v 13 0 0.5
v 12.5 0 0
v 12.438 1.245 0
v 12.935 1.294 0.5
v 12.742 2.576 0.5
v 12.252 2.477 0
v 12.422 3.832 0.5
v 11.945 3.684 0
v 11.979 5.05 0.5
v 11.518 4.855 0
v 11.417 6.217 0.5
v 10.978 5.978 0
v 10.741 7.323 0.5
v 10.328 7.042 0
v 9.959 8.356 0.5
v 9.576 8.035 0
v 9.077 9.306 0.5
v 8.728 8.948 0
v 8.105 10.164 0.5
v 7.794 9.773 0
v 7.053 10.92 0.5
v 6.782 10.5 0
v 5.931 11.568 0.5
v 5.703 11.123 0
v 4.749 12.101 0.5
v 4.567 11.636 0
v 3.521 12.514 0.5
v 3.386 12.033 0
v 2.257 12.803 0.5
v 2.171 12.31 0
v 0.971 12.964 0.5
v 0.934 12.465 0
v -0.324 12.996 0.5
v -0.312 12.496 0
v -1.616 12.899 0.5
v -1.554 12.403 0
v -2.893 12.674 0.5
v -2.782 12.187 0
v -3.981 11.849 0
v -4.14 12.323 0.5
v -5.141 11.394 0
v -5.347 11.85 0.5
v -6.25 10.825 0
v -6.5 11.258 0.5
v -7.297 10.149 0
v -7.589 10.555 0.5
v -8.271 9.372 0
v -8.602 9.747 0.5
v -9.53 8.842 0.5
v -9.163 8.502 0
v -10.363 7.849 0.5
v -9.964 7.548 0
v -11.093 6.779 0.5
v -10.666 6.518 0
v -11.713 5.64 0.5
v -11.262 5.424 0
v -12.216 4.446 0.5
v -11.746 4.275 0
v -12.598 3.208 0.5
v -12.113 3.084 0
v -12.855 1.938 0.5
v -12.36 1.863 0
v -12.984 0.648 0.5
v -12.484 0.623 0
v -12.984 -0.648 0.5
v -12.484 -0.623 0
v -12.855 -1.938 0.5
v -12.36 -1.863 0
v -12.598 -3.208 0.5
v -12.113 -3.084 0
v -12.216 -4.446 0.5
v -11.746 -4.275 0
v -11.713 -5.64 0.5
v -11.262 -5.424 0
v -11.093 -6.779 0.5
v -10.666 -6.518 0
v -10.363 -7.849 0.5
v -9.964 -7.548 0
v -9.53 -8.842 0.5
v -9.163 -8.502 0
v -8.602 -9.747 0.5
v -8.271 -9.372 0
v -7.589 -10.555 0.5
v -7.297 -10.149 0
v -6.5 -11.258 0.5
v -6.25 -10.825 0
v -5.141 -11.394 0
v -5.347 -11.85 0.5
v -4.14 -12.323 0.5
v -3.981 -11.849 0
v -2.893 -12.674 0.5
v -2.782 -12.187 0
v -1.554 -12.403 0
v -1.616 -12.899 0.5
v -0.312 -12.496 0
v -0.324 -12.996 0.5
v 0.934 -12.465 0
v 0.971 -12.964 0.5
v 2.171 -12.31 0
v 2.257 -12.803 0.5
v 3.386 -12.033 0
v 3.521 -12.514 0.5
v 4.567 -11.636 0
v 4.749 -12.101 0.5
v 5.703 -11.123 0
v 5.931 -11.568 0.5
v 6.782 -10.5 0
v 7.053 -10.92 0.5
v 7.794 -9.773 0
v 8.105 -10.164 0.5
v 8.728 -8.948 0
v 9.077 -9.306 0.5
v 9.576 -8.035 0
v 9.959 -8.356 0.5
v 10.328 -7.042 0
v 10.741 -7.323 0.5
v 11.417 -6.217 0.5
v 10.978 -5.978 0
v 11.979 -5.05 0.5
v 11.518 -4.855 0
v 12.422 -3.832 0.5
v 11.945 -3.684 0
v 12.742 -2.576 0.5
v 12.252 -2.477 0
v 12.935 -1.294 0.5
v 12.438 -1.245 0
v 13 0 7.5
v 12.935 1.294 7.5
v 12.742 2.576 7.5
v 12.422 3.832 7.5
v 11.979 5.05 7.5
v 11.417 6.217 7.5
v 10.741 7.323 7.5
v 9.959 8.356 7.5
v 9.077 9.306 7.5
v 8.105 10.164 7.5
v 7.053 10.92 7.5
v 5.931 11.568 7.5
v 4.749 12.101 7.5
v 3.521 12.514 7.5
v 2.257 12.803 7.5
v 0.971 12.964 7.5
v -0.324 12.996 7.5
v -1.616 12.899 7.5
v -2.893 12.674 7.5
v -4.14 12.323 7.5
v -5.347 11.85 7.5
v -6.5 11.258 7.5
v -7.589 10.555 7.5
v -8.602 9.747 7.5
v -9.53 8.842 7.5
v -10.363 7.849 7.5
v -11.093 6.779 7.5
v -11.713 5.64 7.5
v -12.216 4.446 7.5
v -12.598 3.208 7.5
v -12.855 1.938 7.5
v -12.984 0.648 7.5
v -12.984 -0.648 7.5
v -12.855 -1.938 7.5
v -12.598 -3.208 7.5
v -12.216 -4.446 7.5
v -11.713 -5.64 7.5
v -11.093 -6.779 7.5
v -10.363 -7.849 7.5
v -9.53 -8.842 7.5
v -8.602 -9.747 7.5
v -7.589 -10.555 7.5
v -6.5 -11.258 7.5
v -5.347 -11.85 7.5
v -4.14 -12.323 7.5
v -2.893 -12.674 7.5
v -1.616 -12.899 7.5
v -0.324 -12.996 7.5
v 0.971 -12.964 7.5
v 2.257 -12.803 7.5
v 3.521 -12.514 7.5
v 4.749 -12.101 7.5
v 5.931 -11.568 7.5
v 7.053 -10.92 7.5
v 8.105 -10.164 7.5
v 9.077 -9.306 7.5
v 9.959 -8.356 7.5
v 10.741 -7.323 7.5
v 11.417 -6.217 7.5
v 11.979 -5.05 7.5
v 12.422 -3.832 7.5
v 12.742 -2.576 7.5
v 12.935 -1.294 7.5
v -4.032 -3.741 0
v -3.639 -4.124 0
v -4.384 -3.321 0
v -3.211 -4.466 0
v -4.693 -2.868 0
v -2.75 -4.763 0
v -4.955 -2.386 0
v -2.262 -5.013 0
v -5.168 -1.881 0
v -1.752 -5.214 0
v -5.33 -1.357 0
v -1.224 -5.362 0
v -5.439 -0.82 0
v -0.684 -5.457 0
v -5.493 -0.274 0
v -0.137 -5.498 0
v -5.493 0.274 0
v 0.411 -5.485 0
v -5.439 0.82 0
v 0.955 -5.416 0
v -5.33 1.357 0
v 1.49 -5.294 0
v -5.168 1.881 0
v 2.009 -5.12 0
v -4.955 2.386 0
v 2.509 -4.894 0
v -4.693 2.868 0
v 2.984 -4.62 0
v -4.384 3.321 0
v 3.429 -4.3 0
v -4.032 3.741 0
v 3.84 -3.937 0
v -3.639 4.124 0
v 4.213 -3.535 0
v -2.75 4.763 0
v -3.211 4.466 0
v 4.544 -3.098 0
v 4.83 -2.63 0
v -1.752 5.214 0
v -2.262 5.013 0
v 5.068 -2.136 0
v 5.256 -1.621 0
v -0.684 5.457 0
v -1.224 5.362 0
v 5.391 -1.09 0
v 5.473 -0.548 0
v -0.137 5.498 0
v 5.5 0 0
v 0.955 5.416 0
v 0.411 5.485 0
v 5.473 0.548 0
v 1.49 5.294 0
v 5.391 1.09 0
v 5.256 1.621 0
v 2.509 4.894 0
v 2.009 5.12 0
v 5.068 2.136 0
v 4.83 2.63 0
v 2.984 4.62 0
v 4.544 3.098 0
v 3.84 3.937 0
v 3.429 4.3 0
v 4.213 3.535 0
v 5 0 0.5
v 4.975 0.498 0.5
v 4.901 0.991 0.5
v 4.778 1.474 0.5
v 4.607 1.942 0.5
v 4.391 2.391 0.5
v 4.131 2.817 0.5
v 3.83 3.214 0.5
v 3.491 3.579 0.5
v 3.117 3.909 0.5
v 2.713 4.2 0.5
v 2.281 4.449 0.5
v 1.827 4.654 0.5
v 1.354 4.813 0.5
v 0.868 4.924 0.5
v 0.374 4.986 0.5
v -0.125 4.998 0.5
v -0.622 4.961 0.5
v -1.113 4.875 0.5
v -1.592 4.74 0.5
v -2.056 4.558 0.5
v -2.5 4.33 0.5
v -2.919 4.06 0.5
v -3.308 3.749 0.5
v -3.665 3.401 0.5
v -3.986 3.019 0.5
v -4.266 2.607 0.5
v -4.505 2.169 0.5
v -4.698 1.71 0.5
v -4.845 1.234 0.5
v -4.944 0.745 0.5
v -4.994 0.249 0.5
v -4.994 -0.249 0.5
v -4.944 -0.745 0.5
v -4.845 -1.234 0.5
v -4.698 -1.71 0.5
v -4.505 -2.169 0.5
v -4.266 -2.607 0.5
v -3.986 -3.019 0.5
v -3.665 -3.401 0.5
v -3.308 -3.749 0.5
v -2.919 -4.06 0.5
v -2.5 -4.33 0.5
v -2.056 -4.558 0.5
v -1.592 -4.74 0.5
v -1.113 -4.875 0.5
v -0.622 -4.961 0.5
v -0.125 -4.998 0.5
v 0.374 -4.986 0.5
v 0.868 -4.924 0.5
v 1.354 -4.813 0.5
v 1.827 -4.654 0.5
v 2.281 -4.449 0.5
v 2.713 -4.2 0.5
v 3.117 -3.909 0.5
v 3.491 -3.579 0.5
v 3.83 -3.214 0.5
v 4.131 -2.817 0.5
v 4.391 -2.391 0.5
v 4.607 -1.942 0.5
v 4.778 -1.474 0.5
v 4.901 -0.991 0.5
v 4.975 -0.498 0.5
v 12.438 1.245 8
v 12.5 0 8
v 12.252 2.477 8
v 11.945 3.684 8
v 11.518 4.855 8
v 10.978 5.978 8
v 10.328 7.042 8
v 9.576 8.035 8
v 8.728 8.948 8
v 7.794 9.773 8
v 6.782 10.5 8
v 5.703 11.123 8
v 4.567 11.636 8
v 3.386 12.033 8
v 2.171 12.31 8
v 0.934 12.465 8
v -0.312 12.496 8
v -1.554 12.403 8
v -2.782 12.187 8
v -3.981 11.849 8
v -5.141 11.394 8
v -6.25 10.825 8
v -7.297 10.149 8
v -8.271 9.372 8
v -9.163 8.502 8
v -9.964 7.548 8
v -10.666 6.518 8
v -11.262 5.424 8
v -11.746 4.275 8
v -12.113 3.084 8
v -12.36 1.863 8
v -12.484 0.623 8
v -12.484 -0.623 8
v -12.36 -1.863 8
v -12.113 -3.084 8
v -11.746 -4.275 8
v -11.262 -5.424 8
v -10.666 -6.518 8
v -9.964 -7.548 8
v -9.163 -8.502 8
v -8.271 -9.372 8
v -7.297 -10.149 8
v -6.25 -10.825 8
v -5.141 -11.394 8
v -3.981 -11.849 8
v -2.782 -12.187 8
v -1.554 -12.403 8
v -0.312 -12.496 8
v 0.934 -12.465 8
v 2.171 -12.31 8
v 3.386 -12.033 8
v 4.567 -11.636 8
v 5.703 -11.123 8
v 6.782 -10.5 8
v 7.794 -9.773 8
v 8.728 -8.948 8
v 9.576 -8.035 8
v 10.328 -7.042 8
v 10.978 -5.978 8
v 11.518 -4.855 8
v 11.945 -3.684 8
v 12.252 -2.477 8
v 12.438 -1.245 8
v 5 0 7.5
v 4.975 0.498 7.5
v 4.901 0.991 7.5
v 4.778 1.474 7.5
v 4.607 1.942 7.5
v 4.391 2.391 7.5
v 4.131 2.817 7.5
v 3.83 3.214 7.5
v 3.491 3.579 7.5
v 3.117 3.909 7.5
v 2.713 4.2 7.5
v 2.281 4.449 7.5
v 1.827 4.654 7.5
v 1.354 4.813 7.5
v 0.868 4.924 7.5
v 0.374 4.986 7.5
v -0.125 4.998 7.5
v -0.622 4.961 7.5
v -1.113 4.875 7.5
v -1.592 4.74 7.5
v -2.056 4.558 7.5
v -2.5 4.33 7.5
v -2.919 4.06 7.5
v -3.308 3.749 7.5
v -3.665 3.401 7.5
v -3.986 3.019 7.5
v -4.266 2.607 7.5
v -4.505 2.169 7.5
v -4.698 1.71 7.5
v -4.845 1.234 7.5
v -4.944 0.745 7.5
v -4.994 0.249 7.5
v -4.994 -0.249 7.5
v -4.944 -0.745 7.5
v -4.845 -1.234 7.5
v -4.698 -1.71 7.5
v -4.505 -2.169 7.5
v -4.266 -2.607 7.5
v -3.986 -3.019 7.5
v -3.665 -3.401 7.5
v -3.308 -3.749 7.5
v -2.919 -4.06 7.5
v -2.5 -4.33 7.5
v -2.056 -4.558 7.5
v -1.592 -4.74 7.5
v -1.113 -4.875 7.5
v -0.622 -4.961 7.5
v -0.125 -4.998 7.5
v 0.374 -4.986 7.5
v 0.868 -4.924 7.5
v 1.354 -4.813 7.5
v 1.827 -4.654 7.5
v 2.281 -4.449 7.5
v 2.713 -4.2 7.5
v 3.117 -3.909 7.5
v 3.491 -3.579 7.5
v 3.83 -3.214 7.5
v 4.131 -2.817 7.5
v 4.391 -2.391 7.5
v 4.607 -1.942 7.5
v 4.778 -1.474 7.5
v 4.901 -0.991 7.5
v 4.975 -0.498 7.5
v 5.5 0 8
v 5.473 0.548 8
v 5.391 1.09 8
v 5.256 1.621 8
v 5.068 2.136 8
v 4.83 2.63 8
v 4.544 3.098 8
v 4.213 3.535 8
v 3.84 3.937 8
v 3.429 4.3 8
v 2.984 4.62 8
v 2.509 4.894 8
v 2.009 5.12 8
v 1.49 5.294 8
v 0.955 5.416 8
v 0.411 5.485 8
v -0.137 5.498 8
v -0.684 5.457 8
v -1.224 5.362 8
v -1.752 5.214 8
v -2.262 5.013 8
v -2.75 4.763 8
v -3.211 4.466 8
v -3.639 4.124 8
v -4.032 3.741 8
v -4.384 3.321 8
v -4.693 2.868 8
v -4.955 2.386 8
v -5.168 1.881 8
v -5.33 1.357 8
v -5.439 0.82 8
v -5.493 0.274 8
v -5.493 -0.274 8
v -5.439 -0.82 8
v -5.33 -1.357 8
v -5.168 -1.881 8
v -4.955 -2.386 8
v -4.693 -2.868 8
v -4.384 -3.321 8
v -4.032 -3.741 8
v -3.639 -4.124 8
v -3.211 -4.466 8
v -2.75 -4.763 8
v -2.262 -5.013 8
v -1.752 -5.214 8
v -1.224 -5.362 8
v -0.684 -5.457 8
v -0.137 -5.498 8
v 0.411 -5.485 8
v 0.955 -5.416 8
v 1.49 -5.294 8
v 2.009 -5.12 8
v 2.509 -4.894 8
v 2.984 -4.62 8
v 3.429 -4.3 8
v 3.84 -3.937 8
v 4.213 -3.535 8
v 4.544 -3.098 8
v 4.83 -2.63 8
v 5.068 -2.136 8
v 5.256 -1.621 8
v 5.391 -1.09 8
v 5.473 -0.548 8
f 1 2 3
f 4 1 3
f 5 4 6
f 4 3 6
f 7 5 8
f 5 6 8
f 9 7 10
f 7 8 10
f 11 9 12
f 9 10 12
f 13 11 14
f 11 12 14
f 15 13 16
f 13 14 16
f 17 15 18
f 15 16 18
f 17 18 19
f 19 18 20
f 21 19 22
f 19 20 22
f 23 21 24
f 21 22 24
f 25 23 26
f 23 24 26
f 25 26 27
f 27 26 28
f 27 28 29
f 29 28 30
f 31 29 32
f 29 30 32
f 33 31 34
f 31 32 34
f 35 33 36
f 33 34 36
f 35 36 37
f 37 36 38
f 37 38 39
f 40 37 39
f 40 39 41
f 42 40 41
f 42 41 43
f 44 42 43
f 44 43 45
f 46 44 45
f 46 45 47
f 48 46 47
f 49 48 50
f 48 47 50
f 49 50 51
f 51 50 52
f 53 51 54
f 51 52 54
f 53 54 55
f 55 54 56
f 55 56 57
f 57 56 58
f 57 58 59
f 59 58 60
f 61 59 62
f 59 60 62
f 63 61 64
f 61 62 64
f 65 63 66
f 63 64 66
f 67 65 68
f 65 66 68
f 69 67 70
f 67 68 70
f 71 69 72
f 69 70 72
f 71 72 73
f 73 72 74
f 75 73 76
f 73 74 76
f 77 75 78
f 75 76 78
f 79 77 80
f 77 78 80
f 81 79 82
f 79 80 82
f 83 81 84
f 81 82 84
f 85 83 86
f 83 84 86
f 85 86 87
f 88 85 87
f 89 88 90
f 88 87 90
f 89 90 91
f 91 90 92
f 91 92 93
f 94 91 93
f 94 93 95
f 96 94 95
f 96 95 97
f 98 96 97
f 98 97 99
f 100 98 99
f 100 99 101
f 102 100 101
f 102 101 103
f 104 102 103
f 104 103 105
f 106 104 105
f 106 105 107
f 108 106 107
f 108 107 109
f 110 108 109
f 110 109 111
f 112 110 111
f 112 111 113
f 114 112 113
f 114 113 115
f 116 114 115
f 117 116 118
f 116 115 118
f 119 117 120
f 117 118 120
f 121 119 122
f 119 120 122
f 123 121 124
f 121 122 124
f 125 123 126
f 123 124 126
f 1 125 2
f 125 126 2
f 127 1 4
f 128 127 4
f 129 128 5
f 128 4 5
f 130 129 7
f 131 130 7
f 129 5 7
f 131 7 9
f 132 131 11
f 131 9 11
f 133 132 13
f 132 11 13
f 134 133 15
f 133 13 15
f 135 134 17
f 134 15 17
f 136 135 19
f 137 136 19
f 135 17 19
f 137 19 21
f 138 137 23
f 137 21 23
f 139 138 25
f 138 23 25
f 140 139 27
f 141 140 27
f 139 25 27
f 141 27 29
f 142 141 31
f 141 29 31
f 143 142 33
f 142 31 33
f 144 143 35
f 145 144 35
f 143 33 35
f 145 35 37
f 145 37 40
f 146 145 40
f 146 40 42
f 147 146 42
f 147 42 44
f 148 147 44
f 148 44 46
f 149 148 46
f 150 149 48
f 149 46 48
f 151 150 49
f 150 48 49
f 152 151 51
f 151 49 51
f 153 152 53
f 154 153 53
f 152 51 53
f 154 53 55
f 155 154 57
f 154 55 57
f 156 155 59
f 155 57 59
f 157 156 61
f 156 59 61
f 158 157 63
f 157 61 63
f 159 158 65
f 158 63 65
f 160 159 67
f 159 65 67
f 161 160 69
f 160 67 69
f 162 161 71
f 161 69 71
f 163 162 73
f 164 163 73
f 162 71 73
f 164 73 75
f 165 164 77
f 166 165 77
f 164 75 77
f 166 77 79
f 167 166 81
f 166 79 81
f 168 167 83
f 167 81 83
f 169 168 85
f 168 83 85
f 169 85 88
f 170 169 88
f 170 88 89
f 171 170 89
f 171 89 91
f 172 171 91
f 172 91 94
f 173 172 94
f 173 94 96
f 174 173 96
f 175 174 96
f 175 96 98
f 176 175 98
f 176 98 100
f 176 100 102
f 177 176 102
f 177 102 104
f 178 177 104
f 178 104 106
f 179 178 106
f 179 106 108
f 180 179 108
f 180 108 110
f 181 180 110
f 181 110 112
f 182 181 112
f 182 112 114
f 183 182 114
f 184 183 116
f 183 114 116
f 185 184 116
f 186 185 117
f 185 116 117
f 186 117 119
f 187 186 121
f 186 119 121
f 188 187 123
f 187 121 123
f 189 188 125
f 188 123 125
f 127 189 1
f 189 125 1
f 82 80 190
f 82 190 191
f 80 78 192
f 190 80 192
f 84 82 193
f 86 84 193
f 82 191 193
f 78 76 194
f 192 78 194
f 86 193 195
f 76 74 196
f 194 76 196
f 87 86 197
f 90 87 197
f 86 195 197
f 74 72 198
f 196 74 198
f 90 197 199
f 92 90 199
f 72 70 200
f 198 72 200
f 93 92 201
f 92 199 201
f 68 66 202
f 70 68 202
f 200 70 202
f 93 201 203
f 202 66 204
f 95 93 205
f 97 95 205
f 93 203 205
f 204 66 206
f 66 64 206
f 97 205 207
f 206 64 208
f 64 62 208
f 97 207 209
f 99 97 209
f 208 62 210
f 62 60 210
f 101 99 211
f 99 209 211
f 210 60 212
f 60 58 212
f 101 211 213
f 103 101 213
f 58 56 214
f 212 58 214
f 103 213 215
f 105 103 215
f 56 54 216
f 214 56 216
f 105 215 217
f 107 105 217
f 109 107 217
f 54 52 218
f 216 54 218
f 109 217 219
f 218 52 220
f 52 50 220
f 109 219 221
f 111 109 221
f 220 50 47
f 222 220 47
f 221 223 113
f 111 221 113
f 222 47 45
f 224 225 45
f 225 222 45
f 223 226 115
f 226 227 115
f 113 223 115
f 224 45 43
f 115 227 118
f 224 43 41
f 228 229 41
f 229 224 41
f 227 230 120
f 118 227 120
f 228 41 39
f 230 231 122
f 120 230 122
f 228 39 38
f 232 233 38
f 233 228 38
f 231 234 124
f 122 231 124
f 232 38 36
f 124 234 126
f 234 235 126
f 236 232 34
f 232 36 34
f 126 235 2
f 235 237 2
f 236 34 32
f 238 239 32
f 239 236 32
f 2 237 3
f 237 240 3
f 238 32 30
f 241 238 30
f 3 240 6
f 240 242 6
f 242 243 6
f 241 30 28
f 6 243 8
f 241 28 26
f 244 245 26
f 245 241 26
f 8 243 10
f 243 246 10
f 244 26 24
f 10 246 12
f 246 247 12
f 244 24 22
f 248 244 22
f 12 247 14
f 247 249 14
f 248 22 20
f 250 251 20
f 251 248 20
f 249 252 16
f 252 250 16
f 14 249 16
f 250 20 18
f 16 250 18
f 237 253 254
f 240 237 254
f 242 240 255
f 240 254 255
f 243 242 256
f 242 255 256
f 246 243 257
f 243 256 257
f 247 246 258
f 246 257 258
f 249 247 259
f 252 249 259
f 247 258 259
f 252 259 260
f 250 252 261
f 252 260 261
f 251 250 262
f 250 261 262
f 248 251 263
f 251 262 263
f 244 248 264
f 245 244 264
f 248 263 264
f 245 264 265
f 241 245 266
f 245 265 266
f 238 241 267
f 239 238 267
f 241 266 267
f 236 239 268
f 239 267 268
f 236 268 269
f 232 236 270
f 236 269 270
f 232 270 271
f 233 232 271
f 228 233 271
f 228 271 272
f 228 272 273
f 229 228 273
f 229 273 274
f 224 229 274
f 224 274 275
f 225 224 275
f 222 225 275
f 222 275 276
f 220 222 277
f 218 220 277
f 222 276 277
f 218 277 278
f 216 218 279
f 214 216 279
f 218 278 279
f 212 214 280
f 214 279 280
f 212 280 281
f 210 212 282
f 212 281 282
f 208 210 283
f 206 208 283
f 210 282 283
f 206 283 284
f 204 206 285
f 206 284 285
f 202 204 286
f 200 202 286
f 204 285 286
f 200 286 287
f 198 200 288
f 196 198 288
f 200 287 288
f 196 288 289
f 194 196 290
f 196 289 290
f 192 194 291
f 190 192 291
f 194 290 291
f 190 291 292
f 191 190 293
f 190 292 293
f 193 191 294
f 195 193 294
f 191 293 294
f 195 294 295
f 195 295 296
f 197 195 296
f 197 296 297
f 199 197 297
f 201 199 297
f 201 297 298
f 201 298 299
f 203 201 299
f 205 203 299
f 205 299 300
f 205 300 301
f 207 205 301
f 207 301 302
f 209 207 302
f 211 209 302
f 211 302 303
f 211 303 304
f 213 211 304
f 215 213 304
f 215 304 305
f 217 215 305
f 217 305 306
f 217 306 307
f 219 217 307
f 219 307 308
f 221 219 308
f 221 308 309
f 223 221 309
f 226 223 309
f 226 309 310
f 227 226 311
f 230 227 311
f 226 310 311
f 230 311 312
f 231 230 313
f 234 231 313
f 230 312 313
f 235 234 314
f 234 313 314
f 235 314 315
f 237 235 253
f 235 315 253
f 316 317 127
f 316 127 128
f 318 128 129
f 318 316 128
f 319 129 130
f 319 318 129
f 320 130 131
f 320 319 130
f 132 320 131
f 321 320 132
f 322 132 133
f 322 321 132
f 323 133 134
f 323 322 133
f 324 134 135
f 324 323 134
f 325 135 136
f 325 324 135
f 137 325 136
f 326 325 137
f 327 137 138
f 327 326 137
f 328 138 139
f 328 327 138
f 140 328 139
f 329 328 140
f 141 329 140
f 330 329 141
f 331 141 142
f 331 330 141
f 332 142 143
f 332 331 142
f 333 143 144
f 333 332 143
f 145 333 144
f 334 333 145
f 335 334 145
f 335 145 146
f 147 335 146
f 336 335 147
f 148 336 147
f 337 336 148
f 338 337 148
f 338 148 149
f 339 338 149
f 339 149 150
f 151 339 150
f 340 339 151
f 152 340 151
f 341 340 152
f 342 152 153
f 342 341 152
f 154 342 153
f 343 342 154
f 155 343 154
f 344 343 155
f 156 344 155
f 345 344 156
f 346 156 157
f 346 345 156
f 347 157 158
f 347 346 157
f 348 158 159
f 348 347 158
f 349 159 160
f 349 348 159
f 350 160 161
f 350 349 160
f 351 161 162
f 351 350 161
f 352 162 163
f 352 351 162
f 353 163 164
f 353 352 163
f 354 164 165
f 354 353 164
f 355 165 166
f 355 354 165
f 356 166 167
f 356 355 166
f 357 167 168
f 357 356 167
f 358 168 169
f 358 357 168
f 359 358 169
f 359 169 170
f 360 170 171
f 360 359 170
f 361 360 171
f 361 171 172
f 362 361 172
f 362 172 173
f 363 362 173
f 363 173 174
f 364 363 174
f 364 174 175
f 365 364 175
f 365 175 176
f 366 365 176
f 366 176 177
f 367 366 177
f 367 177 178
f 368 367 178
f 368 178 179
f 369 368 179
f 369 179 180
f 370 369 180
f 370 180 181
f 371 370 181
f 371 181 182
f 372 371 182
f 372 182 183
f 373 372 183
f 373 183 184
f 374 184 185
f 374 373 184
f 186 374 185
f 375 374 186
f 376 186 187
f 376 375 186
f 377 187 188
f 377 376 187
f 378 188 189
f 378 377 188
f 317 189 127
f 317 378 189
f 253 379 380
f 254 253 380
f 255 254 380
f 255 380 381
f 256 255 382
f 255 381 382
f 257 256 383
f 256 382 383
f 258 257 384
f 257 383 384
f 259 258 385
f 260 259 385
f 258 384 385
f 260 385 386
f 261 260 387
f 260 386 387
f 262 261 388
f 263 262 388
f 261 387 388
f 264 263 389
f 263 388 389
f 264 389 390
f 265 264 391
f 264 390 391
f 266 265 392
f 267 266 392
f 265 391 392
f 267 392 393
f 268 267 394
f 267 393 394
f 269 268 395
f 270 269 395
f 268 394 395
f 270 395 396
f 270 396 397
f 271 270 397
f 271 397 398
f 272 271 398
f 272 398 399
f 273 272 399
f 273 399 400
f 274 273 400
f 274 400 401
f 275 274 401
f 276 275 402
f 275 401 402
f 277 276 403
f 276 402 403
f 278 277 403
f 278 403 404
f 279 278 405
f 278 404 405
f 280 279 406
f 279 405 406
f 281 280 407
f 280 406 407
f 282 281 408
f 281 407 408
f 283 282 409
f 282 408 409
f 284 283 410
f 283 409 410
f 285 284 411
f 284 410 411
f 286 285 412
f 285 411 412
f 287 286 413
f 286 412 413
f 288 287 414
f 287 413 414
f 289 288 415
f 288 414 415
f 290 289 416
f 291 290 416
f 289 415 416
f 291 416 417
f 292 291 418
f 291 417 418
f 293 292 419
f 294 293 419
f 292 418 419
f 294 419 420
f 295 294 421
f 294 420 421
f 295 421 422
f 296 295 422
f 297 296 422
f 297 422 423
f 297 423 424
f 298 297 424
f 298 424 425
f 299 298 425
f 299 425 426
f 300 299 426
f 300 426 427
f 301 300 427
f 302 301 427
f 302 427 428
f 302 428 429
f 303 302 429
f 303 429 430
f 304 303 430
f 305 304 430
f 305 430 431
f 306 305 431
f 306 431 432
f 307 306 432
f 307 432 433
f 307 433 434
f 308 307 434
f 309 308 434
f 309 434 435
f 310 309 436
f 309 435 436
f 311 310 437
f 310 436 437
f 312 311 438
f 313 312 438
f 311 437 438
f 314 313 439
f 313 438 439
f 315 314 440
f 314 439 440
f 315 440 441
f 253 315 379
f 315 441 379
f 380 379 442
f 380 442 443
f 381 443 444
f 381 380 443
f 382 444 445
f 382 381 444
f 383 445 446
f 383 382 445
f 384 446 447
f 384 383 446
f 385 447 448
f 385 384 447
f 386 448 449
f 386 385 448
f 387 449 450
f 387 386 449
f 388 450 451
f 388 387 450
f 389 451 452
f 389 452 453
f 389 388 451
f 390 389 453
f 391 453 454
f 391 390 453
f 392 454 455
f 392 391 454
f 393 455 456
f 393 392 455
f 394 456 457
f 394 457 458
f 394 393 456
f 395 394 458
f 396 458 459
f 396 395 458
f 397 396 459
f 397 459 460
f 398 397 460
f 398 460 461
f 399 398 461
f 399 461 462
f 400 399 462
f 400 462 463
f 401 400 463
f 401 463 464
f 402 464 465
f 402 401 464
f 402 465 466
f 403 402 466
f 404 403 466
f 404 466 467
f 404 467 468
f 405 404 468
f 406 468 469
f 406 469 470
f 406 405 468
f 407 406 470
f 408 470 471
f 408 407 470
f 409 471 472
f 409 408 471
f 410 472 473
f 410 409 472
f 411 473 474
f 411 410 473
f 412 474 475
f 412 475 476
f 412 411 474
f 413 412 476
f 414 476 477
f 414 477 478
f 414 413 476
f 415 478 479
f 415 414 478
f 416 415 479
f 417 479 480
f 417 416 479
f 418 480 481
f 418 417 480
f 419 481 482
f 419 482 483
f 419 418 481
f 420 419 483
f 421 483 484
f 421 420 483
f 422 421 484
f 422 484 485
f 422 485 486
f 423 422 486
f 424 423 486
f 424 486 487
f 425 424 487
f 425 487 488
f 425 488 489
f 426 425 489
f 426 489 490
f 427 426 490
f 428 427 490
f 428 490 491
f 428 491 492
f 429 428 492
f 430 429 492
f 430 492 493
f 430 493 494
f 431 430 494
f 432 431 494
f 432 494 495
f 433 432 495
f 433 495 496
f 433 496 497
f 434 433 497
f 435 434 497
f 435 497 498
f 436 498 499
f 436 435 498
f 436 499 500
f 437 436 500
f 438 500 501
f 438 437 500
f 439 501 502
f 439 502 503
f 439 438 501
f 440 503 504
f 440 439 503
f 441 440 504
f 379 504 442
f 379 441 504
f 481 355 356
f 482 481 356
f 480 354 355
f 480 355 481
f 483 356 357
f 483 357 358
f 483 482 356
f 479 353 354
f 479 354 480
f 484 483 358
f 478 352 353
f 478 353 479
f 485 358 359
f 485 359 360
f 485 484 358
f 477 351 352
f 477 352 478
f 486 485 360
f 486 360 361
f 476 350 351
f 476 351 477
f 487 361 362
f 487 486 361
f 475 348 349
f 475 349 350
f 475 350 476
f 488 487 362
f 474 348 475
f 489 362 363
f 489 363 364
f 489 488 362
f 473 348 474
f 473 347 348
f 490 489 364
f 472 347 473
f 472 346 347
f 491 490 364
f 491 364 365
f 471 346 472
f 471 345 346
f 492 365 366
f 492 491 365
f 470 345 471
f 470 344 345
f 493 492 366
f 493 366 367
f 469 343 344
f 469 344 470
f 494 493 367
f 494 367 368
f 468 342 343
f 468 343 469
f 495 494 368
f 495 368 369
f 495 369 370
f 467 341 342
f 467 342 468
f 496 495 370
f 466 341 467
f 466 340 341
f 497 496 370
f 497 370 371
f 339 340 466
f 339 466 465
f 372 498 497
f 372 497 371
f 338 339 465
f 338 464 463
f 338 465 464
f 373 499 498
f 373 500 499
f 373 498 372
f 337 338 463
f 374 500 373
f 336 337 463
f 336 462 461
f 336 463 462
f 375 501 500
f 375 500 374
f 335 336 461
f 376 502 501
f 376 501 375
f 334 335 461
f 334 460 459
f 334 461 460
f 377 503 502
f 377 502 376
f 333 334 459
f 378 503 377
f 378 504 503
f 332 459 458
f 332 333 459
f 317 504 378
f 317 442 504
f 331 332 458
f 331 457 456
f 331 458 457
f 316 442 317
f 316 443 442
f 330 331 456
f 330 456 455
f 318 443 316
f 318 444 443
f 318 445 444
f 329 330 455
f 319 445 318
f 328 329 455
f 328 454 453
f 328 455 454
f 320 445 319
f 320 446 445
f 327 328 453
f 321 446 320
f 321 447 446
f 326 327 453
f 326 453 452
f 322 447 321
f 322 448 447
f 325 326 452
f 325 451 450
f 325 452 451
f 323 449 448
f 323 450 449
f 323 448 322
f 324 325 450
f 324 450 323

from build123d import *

# Parameters (mm, degrees)
SKETCH1_R           = 13
BOSS_EXTRUDE1_DEPTH = 8
SKETCH2_R           = 5
CUT_EXTRUDE1_DEPTH  = 8
CHAMFER1_SIZE       = 0.5


with BuildPart() as part:
    # Sketch1 → Boss-Extrude1 (new body)
    with BuildSketch(Plane.XY):
        Circle(SKETCH1_R)
    extrude(amount=BOSS_EXTRUDE1_DEPTH)

    # Sketch2 → Cut-Extrude1 (cut)
    with BuildSketch(Plane.XY.offset(8)):
        Circle(SKETCH2_R)
    extrude(amount=-CUT_EXTRUDE1_DEPTH, mode=Mode.SUBTRACT)

    # Chamfer1
    chamfer1_edges = [part.edges().sort_by_distance(p)[0] for p in [
        (-13, 0, 0),
        (-13, 0, 8),
        (-5, 0, 0),
        (-5, 0, 8),
    ]]
    chamfer(chamfer1_edges, length=CHAMFER1_SIZE)


solid = part.part
